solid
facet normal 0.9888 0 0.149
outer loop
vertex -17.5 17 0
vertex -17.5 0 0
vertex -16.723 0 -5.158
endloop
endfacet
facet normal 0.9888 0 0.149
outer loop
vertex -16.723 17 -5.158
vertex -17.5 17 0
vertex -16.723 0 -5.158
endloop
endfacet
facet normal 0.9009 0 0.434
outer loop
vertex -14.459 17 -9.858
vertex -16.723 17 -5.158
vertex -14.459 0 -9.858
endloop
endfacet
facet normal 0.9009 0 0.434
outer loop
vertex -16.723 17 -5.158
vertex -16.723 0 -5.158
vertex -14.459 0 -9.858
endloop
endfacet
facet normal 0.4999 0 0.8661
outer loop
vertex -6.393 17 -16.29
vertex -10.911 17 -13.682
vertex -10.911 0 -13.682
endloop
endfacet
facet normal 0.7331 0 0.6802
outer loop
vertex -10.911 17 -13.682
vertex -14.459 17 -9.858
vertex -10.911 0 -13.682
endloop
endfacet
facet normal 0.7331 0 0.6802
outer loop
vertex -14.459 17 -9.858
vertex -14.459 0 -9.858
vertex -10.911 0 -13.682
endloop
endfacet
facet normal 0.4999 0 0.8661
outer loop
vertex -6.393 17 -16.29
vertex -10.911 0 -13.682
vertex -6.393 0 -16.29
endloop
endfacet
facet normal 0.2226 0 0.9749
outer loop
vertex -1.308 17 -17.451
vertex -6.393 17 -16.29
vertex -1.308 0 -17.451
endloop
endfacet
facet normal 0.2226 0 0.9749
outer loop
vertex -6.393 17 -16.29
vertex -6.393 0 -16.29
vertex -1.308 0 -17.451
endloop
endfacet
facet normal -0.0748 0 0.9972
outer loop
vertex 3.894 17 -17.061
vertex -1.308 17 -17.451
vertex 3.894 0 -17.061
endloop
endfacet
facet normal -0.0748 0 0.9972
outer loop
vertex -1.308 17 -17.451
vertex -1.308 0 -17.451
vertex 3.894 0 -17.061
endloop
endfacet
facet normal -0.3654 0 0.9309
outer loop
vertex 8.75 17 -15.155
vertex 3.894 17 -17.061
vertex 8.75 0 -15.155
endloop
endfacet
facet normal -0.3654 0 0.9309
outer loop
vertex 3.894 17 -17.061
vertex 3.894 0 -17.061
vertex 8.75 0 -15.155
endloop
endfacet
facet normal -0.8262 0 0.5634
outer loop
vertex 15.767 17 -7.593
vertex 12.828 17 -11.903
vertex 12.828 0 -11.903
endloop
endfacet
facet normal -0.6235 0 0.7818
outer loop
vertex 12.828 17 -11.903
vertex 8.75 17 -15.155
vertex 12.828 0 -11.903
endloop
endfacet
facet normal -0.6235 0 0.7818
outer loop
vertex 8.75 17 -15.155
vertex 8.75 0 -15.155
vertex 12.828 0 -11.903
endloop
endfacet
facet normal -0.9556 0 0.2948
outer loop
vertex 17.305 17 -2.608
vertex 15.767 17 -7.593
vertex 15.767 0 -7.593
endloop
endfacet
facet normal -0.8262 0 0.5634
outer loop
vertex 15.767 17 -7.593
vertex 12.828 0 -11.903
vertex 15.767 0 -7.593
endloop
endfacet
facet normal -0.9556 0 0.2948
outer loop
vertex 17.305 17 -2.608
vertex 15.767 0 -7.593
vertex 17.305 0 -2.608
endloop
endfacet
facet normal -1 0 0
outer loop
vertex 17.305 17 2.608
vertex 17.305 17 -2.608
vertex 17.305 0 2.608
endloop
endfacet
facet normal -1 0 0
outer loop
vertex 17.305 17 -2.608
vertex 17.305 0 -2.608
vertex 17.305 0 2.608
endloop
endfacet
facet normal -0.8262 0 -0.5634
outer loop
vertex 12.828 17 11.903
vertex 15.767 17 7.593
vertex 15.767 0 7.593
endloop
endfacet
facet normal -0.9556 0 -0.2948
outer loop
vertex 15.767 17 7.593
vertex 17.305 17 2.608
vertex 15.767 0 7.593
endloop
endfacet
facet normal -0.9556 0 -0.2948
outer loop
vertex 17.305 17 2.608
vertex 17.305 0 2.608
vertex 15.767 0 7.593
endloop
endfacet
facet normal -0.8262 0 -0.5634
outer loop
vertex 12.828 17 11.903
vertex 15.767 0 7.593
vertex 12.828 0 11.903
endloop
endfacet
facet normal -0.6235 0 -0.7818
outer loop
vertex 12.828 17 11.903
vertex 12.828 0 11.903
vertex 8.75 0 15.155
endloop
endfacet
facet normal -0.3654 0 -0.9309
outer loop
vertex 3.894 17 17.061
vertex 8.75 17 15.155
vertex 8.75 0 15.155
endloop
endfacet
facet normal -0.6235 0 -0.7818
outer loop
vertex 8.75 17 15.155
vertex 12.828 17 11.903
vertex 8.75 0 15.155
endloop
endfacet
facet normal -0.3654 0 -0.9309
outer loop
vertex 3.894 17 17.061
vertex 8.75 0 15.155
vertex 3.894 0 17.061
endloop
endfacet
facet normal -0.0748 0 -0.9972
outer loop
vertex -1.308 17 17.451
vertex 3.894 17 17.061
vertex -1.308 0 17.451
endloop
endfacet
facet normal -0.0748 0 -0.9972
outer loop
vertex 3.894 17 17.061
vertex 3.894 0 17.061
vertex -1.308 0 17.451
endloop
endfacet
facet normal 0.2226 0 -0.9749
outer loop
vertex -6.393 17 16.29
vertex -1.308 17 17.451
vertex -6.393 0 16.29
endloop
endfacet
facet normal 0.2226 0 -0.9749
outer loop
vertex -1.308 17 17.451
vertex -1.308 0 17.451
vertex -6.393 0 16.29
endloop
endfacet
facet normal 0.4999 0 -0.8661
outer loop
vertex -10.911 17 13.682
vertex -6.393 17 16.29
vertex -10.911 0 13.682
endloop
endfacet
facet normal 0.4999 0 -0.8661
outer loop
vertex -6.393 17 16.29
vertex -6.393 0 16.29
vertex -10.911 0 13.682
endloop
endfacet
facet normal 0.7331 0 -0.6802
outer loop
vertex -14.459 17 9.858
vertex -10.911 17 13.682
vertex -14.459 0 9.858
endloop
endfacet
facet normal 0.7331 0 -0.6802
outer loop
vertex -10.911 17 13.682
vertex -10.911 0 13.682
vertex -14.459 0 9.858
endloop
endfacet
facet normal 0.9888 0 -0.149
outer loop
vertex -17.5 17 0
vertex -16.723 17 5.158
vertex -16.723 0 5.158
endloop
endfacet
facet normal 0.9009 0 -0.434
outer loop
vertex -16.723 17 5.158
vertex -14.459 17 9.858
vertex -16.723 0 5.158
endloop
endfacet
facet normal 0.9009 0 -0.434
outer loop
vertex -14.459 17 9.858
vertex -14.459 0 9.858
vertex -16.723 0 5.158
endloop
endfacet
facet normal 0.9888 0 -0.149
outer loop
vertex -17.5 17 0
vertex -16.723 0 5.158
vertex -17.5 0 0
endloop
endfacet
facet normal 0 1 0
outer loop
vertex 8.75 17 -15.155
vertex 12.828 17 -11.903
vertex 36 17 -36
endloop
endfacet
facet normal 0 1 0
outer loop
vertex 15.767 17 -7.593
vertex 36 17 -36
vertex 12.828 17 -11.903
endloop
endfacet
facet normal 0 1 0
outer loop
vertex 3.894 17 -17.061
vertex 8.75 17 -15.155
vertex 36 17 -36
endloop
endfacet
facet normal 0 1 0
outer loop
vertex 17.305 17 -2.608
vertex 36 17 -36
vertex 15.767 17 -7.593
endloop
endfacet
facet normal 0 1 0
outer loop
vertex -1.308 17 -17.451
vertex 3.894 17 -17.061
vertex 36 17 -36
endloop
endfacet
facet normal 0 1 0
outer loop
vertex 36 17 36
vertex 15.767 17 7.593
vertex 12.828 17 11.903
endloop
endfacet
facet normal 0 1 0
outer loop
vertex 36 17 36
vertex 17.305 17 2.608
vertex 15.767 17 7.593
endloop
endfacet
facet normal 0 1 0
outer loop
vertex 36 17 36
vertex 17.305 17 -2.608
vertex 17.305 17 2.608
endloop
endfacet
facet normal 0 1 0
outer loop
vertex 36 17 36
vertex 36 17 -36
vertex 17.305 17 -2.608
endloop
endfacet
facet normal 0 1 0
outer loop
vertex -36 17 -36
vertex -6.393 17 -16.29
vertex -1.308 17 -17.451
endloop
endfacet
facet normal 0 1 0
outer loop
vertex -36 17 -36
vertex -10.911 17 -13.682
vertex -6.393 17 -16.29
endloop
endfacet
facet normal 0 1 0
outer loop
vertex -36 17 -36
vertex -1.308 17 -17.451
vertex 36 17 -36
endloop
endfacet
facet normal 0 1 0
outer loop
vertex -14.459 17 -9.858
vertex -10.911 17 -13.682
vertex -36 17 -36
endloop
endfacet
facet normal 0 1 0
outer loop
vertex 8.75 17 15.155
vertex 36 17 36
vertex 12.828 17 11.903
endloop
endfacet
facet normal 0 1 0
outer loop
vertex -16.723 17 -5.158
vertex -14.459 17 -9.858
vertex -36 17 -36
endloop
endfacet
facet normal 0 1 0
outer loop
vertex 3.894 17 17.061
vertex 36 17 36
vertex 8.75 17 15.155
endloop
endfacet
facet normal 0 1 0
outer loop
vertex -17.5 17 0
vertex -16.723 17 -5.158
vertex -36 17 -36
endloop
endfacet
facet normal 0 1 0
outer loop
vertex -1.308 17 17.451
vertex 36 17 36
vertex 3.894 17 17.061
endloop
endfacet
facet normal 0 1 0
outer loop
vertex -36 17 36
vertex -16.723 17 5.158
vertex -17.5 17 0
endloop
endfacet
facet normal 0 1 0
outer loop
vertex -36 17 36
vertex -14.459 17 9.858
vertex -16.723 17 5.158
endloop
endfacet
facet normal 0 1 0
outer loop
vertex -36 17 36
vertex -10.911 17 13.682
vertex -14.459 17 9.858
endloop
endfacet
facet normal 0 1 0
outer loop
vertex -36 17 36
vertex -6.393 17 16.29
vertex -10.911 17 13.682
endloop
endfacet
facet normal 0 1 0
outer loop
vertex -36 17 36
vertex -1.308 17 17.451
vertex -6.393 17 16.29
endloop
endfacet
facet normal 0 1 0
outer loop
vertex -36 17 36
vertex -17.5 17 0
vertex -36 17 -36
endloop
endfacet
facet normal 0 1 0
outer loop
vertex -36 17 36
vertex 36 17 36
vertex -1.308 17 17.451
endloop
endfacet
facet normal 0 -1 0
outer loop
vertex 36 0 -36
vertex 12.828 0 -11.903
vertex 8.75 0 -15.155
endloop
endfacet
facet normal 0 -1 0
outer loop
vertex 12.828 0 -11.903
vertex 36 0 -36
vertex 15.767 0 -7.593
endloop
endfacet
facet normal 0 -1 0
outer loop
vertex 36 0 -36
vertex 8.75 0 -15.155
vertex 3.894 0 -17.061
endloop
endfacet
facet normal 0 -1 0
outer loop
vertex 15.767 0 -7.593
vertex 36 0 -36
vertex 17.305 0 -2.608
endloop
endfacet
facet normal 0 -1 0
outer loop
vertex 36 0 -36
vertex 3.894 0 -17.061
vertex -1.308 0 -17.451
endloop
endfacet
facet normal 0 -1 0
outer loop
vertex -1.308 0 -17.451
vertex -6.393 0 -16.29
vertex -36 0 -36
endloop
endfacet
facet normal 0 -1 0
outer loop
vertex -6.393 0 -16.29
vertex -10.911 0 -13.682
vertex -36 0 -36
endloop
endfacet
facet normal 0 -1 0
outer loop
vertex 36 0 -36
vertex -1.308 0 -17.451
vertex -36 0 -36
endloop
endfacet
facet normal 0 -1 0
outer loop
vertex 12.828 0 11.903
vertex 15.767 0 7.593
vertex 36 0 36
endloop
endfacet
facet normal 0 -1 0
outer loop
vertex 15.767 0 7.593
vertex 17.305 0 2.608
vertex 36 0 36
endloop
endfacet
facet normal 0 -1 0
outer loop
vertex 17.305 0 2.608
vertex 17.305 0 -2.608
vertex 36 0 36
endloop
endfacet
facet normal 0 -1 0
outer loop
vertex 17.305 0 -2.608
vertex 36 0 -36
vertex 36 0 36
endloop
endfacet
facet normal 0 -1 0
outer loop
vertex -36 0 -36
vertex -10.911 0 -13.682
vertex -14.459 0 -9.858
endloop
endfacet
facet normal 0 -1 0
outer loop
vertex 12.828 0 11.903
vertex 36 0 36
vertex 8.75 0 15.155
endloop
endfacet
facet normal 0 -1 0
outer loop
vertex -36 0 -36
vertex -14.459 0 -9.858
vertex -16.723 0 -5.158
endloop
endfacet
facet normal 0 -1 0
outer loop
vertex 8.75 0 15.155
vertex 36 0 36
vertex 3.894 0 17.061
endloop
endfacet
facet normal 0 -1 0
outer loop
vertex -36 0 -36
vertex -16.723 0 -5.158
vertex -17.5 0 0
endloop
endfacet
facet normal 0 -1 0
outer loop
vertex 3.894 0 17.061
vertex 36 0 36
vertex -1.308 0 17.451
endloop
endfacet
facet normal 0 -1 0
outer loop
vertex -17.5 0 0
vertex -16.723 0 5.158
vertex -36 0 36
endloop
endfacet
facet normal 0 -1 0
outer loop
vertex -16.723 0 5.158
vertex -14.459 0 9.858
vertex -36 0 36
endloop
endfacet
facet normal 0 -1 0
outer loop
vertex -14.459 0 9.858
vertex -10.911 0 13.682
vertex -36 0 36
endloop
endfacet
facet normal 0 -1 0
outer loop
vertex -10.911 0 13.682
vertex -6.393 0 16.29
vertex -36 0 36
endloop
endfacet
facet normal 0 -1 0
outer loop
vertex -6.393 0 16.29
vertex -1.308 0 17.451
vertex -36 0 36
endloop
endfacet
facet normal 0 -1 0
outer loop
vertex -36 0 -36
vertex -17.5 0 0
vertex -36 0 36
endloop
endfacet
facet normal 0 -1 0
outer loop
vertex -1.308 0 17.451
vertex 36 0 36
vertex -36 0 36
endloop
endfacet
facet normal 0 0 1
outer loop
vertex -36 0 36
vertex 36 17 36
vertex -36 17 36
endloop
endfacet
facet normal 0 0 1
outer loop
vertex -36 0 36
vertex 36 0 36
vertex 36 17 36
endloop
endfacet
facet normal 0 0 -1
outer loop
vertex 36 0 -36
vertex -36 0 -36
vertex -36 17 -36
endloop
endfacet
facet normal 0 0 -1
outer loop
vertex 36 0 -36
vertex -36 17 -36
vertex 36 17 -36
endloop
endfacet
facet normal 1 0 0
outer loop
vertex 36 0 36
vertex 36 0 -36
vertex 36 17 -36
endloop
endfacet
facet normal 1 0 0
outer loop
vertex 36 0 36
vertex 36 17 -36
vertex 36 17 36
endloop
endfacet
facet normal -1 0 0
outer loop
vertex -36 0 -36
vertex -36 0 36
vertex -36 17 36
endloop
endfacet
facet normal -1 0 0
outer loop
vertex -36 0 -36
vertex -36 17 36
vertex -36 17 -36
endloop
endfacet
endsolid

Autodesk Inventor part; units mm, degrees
sketch "スケッチ1" plane through (0, 0, 0) normal (0, 1, 0) x (-1, 0, 0)
  circle A0 centre (0, 0) radius 17.5
  line L0 (36, -36) -> (-36, -36)
  line L1 (-36, -36) -> (-36, 36)
  line L2 (-36, 36) -> (36, 36)
  line L3 (36, 36) -> (36, -36)
  line L4 (36, -36) -> (-36, 36) construction
  line L5 (-36, -36) -> (36, 36) construction
  dimension "d0" = 35
  dimension "d1" = 72
  dimension "d2" = 72
extrude "押し出し1" add sketch "スケッチ1" along normal blind 17
properties part number "bearing3b"
